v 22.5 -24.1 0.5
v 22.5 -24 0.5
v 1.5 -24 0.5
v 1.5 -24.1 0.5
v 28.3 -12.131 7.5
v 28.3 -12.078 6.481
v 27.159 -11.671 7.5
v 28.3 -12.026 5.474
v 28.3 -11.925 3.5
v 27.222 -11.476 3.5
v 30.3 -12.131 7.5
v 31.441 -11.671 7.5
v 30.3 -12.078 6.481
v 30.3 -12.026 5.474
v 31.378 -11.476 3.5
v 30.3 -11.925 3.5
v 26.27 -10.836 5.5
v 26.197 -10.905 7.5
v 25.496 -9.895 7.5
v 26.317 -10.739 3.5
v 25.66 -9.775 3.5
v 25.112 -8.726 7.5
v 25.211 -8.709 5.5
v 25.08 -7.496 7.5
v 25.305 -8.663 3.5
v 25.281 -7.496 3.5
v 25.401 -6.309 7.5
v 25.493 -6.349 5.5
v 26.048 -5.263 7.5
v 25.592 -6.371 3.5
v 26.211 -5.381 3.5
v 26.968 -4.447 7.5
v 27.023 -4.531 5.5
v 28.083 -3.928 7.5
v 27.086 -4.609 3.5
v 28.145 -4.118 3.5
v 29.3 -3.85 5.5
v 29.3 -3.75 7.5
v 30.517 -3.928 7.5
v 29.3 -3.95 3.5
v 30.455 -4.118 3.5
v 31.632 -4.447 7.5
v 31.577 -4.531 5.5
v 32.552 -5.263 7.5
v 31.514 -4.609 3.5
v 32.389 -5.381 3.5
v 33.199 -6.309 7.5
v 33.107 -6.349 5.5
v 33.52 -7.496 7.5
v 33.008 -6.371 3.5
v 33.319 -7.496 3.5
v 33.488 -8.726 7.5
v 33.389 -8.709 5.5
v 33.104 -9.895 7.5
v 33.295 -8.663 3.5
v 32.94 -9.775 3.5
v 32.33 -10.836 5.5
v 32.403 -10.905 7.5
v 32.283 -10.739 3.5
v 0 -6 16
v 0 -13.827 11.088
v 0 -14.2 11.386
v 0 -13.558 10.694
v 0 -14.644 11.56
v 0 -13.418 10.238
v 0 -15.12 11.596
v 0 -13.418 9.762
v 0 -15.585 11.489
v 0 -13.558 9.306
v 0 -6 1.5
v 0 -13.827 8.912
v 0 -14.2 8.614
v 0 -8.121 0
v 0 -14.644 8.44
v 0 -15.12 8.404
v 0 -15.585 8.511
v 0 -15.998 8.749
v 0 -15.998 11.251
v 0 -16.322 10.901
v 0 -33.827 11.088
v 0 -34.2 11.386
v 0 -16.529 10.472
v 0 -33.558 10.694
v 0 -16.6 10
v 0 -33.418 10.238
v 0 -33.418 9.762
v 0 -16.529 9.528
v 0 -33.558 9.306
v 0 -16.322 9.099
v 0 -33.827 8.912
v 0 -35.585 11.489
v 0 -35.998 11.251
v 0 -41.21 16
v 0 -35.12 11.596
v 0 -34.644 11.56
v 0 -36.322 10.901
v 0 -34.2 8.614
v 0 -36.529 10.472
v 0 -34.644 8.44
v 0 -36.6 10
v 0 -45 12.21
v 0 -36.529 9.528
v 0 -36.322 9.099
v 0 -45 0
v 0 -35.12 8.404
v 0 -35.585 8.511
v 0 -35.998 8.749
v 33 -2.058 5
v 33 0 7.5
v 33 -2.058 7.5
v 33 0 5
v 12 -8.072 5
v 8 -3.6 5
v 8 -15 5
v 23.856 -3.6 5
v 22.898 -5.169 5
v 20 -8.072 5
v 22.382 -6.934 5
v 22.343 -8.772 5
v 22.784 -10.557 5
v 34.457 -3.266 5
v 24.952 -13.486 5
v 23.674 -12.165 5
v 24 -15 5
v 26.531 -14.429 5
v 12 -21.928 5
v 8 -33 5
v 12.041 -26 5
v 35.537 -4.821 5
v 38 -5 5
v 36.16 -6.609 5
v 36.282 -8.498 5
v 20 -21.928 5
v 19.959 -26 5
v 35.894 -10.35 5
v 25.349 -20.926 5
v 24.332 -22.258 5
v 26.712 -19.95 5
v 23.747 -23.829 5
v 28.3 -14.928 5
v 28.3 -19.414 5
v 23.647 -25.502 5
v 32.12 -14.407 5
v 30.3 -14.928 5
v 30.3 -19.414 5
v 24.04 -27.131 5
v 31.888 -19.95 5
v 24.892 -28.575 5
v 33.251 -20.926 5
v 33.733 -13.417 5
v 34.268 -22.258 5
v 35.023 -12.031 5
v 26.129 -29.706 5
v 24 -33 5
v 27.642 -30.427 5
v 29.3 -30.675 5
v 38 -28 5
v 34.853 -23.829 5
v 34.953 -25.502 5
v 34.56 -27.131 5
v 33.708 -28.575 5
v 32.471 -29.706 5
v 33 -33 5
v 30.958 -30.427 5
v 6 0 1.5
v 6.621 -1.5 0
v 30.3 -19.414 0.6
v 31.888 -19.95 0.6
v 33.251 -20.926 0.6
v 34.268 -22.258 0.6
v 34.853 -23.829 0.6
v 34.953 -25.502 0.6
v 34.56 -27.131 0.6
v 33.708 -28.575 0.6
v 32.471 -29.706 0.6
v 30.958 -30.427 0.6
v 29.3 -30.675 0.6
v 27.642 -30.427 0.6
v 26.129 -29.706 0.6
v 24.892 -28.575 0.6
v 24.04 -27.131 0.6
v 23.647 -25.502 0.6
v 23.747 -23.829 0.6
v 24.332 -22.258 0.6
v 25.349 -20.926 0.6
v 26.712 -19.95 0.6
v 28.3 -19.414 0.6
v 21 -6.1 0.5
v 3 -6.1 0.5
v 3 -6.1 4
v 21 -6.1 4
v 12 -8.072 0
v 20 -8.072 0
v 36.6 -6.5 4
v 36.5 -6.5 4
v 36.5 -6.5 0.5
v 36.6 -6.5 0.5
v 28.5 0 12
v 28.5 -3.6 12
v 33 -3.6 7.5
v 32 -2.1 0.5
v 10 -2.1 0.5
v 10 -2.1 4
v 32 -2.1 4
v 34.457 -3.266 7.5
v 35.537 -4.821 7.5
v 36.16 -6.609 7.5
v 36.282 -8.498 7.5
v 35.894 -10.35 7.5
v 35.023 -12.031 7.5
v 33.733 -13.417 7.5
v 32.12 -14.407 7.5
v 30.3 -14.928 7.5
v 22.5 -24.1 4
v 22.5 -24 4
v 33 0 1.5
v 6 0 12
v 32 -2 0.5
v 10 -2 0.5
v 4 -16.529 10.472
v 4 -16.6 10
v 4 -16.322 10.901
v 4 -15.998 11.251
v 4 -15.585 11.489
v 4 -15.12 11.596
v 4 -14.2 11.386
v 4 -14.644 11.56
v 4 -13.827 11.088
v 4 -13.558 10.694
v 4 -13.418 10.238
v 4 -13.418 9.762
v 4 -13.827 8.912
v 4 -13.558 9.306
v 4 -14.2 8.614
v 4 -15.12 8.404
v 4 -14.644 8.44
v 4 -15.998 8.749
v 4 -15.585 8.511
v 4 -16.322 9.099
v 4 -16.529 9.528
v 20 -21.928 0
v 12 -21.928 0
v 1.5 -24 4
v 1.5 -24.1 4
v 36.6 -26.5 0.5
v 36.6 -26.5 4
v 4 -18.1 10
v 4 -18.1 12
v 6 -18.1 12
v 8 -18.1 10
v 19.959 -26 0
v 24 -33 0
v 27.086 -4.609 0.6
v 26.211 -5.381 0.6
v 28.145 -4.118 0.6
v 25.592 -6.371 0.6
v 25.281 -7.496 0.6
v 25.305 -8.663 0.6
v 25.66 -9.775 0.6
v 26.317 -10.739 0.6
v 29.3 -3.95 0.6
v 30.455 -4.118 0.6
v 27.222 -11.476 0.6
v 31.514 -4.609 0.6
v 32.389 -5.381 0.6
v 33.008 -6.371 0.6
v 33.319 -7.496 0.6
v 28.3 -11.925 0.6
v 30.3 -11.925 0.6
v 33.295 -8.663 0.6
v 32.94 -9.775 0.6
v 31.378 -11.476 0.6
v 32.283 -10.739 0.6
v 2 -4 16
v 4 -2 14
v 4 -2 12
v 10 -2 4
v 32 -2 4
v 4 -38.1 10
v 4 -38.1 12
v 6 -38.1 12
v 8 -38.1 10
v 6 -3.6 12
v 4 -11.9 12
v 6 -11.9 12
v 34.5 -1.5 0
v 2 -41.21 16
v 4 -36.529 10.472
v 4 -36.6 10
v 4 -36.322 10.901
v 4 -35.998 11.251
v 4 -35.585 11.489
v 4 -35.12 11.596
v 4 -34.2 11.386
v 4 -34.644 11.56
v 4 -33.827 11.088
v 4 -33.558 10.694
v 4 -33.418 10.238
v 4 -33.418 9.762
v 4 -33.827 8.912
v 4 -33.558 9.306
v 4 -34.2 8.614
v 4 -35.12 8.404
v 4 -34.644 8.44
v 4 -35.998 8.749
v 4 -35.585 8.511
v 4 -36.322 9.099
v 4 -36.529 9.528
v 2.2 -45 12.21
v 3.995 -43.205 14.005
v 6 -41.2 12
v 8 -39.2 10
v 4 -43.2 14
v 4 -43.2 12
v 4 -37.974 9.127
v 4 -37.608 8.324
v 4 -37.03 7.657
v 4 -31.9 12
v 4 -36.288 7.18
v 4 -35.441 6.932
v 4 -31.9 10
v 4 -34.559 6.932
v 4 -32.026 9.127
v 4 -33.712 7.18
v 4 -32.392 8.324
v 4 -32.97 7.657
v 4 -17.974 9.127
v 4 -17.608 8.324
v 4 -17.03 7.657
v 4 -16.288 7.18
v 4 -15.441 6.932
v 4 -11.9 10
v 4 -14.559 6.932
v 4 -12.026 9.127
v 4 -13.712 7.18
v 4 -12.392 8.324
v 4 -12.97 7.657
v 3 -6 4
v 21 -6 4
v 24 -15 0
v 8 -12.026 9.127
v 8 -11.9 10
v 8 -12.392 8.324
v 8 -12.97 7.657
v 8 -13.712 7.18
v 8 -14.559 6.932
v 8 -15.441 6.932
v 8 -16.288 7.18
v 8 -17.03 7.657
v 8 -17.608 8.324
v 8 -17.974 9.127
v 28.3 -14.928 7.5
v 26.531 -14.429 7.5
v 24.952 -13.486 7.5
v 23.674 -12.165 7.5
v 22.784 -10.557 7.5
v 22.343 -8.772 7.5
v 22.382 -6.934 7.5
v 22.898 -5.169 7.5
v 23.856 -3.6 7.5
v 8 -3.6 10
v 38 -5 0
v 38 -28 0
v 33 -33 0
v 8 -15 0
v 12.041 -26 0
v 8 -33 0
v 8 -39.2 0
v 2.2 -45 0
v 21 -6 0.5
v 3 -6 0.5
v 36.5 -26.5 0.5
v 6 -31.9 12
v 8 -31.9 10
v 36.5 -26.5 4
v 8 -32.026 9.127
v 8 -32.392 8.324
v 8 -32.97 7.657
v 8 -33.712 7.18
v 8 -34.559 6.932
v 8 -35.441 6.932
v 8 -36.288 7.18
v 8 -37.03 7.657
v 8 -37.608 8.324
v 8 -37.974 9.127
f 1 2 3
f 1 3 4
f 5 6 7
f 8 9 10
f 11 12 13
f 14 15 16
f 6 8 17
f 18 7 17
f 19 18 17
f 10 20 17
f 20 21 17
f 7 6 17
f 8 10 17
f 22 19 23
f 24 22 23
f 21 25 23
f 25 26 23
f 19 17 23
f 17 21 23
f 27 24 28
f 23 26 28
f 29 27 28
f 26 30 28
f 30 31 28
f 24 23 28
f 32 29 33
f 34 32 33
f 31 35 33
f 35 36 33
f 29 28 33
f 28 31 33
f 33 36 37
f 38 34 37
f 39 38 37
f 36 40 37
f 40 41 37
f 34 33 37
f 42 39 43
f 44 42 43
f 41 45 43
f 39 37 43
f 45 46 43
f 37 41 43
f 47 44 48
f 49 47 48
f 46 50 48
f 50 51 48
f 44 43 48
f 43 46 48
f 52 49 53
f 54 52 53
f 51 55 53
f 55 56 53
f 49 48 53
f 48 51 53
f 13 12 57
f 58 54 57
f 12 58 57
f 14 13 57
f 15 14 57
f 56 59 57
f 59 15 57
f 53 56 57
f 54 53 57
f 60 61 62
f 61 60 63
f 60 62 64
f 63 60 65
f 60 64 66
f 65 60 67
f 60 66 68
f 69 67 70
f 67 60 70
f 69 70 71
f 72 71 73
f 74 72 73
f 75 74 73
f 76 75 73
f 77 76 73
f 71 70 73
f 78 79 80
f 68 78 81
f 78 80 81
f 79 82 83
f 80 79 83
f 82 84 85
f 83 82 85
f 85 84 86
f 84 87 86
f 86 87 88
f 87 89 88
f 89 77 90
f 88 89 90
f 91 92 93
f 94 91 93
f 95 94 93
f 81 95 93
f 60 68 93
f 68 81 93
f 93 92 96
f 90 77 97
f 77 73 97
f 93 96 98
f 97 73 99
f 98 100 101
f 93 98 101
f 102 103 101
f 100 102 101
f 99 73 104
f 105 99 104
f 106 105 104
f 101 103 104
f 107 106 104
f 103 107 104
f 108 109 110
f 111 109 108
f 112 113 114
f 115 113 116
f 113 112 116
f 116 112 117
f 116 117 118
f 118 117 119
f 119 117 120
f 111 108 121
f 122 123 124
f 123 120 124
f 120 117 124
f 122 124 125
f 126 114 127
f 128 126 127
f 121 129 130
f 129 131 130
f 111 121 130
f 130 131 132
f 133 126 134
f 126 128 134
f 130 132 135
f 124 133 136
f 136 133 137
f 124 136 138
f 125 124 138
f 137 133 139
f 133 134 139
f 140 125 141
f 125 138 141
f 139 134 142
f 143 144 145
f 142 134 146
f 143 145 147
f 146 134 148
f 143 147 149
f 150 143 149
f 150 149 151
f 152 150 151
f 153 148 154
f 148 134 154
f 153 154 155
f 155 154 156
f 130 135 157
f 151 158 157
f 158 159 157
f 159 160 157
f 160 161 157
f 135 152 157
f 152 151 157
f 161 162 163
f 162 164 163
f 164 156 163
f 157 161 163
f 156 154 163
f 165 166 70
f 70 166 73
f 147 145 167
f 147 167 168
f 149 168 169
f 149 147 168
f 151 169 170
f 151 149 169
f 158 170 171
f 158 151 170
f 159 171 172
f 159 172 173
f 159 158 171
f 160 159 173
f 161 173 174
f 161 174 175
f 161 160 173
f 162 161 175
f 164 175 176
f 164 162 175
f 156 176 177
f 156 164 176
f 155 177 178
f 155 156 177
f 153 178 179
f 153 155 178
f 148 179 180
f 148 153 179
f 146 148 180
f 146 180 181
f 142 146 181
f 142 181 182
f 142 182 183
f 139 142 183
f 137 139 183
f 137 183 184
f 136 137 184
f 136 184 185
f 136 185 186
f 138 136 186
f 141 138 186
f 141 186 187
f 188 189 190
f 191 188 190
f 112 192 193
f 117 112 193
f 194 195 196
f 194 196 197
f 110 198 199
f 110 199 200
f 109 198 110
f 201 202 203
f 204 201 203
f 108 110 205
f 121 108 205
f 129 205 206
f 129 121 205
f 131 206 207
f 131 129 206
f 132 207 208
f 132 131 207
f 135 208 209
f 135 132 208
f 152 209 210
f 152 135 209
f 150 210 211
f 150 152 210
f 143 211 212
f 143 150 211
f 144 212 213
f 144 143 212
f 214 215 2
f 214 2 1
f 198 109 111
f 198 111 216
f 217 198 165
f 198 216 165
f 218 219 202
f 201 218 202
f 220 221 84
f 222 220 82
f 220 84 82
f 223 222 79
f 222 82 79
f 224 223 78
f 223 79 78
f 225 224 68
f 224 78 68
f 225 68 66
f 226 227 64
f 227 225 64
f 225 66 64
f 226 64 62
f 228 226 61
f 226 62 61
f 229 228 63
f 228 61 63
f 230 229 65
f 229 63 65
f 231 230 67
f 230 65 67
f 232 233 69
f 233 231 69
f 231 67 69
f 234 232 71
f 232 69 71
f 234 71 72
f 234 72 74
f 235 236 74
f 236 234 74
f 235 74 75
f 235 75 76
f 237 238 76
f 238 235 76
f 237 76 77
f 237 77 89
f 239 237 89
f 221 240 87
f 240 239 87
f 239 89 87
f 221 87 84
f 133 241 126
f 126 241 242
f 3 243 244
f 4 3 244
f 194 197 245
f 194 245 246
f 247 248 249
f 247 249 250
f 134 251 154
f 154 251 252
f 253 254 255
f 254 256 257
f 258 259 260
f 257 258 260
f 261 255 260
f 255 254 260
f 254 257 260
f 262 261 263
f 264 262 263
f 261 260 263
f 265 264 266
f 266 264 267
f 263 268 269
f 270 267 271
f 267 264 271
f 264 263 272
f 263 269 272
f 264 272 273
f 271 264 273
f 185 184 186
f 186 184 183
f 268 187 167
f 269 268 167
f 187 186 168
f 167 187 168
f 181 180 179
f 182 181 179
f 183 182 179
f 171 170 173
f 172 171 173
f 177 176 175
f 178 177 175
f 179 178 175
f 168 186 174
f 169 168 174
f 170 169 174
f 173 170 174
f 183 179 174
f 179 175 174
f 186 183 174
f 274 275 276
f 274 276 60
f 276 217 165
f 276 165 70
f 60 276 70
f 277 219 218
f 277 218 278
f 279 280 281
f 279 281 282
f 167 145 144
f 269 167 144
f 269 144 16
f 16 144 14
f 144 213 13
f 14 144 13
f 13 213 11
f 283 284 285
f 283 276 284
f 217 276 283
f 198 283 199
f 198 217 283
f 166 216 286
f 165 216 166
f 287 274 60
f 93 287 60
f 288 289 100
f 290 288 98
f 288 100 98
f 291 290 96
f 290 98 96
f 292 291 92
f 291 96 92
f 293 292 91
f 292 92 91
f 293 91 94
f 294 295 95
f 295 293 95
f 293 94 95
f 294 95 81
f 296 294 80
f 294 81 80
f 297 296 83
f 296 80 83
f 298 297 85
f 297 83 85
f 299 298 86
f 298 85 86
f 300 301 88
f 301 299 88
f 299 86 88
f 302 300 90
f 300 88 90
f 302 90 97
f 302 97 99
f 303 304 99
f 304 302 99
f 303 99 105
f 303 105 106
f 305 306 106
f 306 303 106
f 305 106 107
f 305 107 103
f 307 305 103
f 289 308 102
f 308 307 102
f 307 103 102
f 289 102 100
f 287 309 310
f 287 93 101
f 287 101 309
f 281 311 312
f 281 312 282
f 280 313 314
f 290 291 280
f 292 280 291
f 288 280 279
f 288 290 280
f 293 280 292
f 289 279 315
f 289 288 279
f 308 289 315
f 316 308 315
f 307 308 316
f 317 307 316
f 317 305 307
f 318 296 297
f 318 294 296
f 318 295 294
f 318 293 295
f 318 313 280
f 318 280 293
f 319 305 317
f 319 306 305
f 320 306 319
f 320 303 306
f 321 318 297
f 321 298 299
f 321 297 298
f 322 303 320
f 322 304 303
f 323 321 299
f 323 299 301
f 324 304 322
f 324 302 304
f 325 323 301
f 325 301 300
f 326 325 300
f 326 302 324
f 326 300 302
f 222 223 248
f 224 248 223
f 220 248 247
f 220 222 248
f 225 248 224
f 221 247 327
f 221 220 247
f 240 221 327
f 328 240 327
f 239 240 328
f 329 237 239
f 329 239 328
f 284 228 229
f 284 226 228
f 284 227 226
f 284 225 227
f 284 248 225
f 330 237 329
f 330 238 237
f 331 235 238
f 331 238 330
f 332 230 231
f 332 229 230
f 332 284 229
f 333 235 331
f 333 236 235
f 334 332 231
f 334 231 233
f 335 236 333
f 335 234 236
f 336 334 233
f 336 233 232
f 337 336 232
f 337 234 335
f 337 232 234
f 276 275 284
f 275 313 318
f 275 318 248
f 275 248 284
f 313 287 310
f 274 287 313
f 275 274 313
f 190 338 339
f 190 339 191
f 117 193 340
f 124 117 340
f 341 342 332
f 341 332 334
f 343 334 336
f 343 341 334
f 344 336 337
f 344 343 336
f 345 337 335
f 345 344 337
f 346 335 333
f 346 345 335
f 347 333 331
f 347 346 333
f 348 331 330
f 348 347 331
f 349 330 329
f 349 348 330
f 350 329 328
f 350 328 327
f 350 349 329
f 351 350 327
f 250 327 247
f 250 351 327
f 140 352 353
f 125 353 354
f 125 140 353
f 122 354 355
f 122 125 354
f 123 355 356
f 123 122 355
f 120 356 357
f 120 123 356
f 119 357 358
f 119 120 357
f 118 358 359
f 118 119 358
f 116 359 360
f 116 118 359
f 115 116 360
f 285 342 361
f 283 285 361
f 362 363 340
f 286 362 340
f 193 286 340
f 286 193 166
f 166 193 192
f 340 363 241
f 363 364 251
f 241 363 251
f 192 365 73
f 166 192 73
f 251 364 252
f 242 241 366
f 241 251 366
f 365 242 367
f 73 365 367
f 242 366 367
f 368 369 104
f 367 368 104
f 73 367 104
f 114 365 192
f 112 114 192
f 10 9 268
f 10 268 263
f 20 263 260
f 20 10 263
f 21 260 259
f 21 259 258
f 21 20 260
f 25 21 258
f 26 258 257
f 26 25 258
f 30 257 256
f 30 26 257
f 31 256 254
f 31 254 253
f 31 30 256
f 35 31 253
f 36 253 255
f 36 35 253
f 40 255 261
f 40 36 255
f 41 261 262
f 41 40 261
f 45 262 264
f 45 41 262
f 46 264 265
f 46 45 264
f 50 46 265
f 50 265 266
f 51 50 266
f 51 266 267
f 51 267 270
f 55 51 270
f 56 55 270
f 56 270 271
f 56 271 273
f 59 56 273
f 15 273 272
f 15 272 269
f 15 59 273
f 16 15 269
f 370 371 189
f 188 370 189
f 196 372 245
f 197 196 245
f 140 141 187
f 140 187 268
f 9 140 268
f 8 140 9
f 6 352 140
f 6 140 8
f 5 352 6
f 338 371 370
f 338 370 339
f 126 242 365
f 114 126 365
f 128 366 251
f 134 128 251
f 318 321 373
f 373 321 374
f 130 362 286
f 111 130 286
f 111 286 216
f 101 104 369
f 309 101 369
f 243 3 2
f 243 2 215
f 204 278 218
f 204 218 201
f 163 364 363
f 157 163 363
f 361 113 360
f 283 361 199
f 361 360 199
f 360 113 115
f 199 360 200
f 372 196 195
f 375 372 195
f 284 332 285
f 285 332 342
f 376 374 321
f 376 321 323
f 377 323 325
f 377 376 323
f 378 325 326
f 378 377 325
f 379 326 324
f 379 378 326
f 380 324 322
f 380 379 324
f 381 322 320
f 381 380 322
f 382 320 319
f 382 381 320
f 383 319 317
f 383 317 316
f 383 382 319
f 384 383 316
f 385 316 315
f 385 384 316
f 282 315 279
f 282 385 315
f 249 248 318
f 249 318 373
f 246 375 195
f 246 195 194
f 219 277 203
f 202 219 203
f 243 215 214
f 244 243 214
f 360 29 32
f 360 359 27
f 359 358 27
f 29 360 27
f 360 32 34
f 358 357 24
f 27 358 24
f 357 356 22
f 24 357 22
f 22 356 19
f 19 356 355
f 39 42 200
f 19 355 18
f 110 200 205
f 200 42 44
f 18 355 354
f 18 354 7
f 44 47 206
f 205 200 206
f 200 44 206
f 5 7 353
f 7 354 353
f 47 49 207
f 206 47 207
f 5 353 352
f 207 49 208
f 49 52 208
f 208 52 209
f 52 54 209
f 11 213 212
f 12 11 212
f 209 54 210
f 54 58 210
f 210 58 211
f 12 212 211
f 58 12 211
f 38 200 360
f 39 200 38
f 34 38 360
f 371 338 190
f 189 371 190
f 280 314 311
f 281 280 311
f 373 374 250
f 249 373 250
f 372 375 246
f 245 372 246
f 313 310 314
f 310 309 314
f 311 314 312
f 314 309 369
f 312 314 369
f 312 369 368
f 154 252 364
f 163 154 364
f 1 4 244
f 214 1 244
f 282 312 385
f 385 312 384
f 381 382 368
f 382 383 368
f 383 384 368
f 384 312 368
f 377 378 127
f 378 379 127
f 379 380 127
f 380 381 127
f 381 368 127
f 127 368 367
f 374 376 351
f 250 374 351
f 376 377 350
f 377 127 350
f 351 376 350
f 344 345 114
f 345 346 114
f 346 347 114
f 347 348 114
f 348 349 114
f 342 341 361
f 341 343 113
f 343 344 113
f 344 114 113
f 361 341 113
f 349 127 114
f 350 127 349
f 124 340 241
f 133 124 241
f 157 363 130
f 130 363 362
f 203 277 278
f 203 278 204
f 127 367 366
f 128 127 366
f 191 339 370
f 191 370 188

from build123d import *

# Parameters (mm, degrees)
PAD_DEPTH        = 16
POCKET_DEPTH     = 45.001
POCKET001_DEPTH  = 11.001
SKETCH003_R      = 7
PAD001_DEPTH     = 2.5
POCKET002_DEPTH  = 6.9
SKETCH005_R      = 1.6
POCKET003_DEPTH  = 38.001
POCKET004_DEPTH  = 4
CHAMFER_SIZE     = 2
CHAMFER001_SIZE  = 3.79
CHAMFER002_SIZE  = 1.5
CHAMFER003_SIZE2 = 4
CHAMFER003_SIZE  = 0.2
SKETCH007_W      = 0.1
SKETCH007_H      = 3.5
POCKET005_DEPTH  = 21
SKETCH008_W      = 0.1
SKETCH008_H      = 3.5
POCKET006_DEPTH  = 18
SKETCH009_W      = 0.1
SKETCH009_H      = 3.5
POCKET007_DEPTH  = 22
SKETCH010_W      = 0.1
SKETCH010_H      = 3.5
POCKET008_DEPTH  = 20


with BuildPart() as body001:
    # Sketch → Pad (new body)
    with BuildSketch(Plane.XY):
        Polygon((0, 45), (2.2, 45), (8, 39.2), (8, 33), (12.041452, 26), (19.958548, 26), (24, 33), (33, 33), (38, 28), (38, 5), (33, 0), (6, 0), (0, 6), align=None)
        Polygon((20, 21.928203), (12, 21.928203), (8, 15), (12, 8.071797), (20, 8.071797), (24, 15), align=None, mode=Mode.SUBTRACT)
    extrude(amount=PAD_DEPTH)

    # Sketch001 → Pocket (cut, through all)
    with BuildSketch(Plane.XZ):
        Polygon((0, 16), (2, 16), (4, 14), (4, 12), (28.5, 12), (33, 7.5), (33, 5), (39, 5), (39, 17), (0, 17), align=None)
    extrude(amount=-POCKET_DEPTH, mode=Mode.SUBTRACT)

    # Sketch002 → Pocket001 (cut, through all)
    with BuildSketch(Plane.XY.offset(5)):
        Polygon((8, 45), (8, 3.6), (33, 3.6), (33, -1), (39, -1), (39, 45), align=None)
    extrude(amount=POCKET001_DEPTH, mode=Mode.SUBTRACT)

    # Sketch003 → Pad001 (join)
    with BuildSketch(Plane.XY.offset(5)):
        with Locations((29.3, 8)):
            Circle(SKETCH003_R)
    extrude(amount=PAD001_DEPTH)

    # Sketch004 → Pocket002 (cut)
    with BuildSketch(Plane.XY.offset(7.5)):
        with BuildLine():
            ThreePointArc((30.3, 19.4138), (29.3, 30.675), (28.3, 19.4138))
            Line((28.3, 19.4138), (28.3, 11.924602))
            ThreePointArc((28.3, 11.924602), (29.3, 3.95), (30.3, 11.924602))
            Line((30.3, 19.4138), (30.3, 11.924602))
        make_face()
    extrude(amount=-POCKET002_DEPTH, mode=Mode.SUBTRACT)

    # Sketch005 → Pocket003 (cut, through all)
    with BuildSketch(Plane.YZ):
        with Locations((15, 10)):
            Circle(SKETCH005_R)
        with Locations((35, 10)):
            Circle(SKETCH005_R)
    extrude(amount=POCKET003_DEPTH, mode=Mode.SUBTRACT)

    # Sketch006 → Pocket004 (cut)
    with BuildSketch(Plane.YZ.offset(8)):
        with BuildLine():
            ThreePointArc((11.9, 10), (15, 6.9), (18.1, 10))
            Line((18.1, 16), (18.1, 10))
            Line((11.9, 16), (18.1, 16))
            Line((11.9, 10), (11.9, 16))
        make_face()
        with BuildLine():
            ThreePointArc((31.9, 10), (35, 6.9), (38.1, 10))
            Line((38.1, 16), (38.1, 10))
            Line((31.9, 16), (38.1, 16))
            Line((31.9, 10), (31.9, 16))
        make_face()
    extrude(amount=-POCKET004_DEPTH, mode=Mode.SUBTRACT)

    # Chamfer
    chamfer_edges = [body001.edges().sort_by_distance(p)[0] for p in [
        (8, 7.75, 12),
        (8, 25, 12),
        (8, 38.65, 12),
    ]]
    chamfer(chamfer_edges, length=CHAMFER_SIZE)

    # Chamfer001
    chamfer001_edges = [body001.edges().sort_by_distance(p)[0] for p in [
        (1, 45, 16),
    ]]
    chamfer(chamfer001_edges, length=CHAMFER001_SIZE)

    # Chamfer002
    chamfer002_edges = [body001.edges().sort_by_distance(p)[0] for p in [
        (3, 3, 0),
        (19.5, 0, 0),
    ]]
    chamfer(chamfer002_edges, length=CHAMFER002_SIZE)

    # Chamfer003
    chamfer003_edges = [body001.edges().sort_by_distance(p)[0] for p in [
        (29.3, 3.95, 7.5),
    ]]
    chamfer003_side = body001.faces().sort_by_distance((33.19017, 2.828889, 7.5))[0]
    chamfer(chamfer003_edges, length=CHAMFER003_SIZE, length2=CHAMFER003_SIZE2, reference=chamfer003_side)

    # Sketch007 → Pocket005 (cut)
    with BuildSketch(Plane.YZ.offset(1.5)):
        with Locations((24.05, 2.25)):
            Rectangle(SKETCH007_W, SKETCH007_H)
    extrude(amount=POCKET005_DEPTH, mode=Mode.SUBTRACT)

    # Sketch008 → Pocket006 (cut)
    with BuildSketch(Plane.YZ.offset(3)):
        with Locations((6.05, 2.25)):
            Rectangle(SKETCH008_W, SKETCH008_H)
    extrude(amount=POCKET006_DEPTH, mode=Mode.SUBTRACT)

    # Sketch009 → Pocket007 (cut)
    with BuildSketch(Plane.YZ.offset(10)):
        with Locations((2.05, 2.25)):
            Rectangle(SKETCH009_W, SKETCH009_H)
    extrude(amount=POCKET007_DEPTH, mode=Mode.SUBTRACT)

    # Sketch010 → Pocket008 (cut)
    with BuildSketch(Plane.XZ.offset(-6.5)):
        with Locations((36.55, 2.25)):
            Rectangle(SKETCH010_W, SKETCH010_H)
    extrude(amount=-POCKET008_DEPTH, mode=Mode.SUBTRACT)


with BuildPart() as z_axis_top_l:
    # Part__Mirroring: instance of Body001
    add(body001.part.mirror(Plane(origin=(0, 0, 0), x_dir=(1, 0, 0), z_dir=(0, 1, 0))))


solid = z_axis_top_l.part
